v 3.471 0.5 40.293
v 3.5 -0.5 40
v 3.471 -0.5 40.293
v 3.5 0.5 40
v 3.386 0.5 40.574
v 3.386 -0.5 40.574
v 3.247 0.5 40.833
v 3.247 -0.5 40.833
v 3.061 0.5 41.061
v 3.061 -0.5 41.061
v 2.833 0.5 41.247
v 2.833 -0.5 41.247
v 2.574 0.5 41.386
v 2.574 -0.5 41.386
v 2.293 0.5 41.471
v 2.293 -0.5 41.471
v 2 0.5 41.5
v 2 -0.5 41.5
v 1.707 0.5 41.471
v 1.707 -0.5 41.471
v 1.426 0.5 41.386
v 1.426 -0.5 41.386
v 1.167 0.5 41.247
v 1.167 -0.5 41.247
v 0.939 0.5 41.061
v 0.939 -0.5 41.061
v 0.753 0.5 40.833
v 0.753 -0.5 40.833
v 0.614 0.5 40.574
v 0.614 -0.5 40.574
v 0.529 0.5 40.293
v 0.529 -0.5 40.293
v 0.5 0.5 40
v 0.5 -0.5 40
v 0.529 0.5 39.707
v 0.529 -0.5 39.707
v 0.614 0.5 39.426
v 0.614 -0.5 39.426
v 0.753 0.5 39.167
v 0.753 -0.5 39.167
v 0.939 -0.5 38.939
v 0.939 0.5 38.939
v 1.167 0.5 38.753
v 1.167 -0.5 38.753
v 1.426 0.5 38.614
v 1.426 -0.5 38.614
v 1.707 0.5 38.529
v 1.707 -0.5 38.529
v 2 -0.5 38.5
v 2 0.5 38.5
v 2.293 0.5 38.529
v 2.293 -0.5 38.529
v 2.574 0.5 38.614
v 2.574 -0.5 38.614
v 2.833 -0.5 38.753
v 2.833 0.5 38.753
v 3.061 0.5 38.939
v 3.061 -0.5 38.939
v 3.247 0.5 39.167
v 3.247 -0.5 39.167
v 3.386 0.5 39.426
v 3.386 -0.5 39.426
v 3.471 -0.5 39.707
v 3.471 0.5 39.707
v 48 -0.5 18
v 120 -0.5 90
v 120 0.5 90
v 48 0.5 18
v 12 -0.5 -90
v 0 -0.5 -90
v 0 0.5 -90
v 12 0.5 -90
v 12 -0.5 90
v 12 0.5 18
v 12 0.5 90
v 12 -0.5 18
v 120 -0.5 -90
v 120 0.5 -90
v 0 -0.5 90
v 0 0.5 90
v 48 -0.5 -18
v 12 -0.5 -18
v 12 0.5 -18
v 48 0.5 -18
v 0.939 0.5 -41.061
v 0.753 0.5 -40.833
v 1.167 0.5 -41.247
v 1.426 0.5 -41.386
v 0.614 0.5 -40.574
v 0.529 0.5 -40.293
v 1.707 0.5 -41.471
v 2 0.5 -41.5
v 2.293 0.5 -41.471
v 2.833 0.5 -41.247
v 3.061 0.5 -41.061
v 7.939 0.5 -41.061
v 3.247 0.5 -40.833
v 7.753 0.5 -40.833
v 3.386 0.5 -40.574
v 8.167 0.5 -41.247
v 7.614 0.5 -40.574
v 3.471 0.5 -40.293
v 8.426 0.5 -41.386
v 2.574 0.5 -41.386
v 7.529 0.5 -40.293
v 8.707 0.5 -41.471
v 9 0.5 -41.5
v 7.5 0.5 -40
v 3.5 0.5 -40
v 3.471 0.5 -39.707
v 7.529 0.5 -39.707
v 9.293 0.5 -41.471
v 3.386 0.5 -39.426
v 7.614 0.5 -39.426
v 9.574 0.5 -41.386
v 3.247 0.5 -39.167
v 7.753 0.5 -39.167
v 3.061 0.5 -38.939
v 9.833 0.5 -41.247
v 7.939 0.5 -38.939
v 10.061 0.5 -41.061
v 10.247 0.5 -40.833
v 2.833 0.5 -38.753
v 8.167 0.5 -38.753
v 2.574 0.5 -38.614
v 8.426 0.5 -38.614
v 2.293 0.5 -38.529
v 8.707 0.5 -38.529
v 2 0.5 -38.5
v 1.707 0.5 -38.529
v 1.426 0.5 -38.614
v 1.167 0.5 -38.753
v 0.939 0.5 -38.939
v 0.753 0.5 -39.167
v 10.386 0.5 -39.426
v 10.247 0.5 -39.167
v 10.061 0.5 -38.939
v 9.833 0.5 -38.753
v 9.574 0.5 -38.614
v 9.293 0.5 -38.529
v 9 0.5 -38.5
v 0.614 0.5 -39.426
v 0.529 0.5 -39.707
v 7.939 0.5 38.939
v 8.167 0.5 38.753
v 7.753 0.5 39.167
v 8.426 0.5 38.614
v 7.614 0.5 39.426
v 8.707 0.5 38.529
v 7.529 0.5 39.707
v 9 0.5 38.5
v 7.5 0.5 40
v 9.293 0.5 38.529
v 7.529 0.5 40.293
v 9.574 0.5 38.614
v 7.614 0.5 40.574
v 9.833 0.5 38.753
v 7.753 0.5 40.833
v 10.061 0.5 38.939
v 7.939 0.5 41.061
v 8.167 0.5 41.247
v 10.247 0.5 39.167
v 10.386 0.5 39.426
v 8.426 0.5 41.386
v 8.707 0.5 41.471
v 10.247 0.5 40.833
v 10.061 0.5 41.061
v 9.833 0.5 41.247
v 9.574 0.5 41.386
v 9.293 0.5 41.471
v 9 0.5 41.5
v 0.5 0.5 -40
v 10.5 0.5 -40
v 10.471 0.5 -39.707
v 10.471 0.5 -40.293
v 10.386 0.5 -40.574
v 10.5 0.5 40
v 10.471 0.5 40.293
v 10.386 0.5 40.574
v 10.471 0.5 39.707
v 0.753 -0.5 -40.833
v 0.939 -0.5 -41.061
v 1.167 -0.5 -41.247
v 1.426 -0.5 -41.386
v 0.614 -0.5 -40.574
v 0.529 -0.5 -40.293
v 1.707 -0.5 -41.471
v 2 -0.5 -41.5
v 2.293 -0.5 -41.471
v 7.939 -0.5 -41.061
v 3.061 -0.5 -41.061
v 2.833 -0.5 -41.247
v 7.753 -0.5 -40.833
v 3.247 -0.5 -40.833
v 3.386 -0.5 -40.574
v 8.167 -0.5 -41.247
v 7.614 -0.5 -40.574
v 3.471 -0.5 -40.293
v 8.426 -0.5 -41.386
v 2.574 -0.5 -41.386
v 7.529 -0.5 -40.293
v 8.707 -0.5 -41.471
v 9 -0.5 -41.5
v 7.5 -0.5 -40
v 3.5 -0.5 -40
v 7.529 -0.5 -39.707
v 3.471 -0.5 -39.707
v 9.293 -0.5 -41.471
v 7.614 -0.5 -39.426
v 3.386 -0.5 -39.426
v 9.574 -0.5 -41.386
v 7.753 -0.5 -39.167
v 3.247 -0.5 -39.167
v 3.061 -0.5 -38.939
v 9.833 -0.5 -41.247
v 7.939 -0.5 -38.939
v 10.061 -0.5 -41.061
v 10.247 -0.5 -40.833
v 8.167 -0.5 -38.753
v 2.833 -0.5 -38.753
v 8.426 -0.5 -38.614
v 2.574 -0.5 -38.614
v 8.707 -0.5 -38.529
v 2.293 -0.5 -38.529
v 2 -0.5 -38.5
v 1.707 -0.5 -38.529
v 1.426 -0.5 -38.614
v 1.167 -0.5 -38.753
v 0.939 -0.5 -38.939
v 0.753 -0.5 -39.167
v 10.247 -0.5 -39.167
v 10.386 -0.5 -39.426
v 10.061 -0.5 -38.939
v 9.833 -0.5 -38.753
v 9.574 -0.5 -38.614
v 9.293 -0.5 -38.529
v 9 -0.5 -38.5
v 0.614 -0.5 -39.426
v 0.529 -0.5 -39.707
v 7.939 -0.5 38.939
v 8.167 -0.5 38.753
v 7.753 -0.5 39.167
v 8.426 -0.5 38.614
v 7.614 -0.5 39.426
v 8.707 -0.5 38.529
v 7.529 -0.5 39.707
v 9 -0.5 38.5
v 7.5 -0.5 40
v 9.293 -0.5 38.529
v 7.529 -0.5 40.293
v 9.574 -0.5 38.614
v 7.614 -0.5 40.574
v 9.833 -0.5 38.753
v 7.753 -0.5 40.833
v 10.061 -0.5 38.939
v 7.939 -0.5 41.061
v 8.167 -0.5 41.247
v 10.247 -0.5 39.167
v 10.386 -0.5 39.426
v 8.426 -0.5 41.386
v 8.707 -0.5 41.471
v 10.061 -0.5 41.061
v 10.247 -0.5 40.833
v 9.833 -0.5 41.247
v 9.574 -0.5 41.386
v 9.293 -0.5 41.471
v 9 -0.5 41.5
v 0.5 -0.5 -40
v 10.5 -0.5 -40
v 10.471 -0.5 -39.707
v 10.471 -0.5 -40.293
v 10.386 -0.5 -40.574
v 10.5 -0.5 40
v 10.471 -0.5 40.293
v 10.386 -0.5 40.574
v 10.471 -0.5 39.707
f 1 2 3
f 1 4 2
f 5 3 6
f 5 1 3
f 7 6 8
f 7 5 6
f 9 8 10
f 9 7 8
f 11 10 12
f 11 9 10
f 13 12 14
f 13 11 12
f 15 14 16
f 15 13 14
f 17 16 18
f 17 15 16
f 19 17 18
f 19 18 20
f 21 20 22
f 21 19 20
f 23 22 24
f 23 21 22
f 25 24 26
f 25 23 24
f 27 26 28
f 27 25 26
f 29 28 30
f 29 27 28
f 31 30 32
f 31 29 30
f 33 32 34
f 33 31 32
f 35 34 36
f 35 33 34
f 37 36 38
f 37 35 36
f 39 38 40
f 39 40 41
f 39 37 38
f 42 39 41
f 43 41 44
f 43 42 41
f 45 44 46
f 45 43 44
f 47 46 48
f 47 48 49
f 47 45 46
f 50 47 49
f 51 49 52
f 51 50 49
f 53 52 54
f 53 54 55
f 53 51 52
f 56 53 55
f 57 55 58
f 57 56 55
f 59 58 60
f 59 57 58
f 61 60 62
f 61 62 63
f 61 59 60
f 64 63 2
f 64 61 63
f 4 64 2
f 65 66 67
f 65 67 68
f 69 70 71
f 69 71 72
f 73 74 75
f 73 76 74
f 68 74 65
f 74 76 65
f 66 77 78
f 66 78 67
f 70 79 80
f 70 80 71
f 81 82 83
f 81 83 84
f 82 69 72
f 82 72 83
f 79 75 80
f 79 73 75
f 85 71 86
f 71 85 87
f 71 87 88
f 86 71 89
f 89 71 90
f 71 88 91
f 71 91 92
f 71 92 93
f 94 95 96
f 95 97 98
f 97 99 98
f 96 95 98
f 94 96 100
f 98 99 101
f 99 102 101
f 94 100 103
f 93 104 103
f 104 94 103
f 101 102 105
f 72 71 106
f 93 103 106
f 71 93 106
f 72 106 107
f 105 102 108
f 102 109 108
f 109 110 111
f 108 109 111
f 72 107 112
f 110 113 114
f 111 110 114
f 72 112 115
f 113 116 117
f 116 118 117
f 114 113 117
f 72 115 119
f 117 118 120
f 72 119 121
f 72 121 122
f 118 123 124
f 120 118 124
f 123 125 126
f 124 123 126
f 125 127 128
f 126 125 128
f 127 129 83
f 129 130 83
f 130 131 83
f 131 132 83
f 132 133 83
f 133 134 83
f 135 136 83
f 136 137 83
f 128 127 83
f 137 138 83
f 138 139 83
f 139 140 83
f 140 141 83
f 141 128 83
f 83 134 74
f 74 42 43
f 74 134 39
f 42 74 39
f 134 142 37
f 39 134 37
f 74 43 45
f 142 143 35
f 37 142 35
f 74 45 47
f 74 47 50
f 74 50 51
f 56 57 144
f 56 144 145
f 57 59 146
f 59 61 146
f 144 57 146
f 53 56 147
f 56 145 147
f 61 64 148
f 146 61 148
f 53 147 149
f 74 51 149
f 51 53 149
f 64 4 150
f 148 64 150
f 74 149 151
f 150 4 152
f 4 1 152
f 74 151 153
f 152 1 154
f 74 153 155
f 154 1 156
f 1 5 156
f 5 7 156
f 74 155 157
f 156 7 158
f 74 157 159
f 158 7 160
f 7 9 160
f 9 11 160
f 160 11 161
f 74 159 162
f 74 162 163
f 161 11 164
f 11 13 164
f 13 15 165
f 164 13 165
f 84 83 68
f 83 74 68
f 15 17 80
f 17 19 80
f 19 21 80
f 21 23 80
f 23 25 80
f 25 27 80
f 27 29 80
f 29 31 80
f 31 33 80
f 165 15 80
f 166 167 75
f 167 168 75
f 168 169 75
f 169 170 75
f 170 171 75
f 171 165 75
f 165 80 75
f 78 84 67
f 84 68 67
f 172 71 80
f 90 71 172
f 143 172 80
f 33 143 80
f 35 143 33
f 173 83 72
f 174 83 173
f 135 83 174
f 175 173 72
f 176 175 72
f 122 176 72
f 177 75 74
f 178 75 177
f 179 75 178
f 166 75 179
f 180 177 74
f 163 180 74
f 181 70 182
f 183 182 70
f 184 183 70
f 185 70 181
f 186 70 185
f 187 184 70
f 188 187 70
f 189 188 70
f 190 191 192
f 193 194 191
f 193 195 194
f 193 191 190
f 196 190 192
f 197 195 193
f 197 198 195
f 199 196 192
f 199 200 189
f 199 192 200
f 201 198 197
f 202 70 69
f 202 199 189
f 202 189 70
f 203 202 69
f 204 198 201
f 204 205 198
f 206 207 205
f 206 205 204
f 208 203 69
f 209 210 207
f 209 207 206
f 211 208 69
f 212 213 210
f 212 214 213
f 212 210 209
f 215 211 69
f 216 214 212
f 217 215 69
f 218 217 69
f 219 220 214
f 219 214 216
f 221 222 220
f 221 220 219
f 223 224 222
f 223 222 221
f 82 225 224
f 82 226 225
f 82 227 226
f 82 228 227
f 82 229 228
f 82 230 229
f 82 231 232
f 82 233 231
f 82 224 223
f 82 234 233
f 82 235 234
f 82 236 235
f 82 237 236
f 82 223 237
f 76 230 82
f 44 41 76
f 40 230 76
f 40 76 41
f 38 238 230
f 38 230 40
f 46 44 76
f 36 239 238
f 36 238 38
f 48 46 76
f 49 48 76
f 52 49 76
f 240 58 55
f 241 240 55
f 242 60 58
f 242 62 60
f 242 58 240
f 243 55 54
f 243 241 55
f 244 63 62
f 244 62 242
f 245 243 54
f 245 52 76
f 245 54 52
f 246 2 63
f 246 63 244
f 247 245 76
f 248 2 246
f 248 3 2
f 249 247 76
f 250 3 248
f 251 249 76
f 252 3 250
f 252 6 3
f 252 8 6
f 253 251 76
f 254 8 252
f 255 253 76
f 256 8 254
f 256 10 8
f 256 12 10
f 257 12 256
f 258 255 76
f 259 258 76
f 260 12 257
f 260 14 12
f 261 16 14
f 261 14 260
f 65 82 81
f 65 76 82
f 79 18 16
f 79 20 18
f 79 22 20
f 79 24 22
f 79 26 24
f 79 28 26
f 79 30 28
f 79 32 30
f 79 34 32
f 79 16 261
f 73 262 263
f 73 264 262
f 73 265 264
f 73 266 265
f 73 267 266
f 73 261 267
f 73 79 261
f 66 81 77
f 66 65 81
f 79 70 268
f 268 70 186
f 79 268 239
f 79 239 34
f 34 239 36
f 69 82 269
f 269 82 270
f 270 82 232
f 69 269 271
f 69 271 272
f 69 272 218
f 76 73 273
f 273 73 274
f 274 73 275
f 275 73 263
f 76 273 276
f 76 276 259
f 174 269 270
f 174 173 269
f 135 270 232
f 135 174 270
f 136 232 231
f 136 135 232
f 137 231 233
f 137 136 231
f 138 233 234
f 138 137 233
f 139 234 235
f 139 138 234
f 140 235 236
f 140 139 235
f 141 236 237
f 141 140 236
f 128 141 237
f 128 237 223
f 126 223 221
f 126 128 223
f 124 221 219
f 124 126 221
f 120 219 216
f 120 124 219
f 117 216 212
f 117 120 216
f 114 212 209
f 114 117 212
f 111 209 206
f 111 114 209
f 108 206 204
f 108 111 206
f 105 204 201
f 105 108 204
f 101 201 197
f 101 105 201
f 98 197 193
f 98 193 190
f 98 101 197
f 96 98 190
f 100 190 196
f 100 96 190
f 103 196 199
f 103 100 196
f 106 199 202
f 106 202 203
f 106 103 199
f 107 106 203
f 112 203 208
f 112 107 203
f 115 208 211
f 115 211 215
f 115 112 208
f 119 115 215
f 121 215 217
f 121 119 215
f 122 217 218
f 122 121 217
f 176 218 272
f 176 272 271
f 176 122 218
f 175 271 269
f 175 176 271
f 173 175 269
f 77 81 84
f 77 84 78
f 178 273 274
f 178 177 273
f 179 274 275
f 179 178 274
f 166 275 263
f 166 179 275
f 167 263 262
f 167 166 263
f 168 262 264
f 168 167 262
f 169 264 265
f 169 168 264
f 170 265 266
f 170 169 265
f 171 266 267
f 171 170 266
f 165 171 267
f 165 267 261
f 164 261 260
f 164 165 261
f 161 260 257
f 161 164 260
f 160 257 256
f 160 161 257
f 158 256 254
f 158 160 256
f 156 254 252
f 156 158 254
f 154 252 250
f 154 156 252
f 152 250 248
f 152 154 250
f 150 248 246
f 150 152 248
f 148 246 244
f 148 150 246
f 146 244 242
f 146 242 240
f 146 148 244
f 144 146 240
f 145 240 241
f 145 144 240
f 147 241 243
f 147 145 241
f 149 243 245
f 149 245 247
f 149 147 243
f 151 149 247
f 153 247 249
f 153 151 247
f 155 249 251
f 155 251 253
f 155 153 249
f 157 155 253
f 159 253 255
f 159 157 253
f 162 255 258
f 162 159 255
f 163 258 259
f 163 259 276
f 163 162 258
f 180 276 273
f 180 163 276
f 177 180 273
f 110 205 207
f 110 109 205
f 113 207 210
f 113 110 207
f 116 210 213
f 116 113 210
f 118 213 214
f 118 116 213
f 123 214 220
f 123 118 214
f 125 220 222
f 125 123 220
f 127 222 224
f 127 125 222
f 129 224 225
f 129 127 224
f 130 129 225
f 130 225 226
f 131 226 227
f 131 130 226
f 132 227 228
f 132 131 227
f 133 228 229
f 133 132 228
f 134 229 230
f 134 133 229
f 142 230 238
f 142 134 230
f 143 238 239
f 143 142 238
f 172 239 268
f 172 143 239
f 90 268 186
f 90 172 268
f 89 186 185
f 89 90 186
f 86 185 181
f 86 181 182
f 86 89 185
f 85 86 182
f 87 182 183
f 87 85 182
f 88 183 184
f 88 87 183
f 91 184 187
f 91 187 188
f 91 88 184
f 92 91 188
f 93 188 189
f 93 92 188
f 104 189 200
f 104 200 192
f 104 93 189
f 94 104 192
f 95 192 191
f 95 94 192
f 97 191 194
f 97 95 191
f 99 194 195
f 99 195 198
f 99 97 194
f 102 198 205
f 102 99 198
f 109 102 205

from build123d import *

# Parameters (mm, degrees)
F0_R     = 1.5
F0_W     = 36
F0_H     = 36
F1_DEPTH = 0.5


with BuildPart() as f1:
    # F0 (on Front) → F1 (new body, symmetric)
    with BuildSketch(Plane.XZ):
        Polygon((12, 90), (0, 90), (0, -90), (12, -90), (12, -18), (12, 18), align=None)
        with Locations((2, -40)):
            Circle(F0_R, mode=Mode.SUBTRACT)
        with Locations((9, -40)):
            Circle(F0_R, mode=Mode.SUBTRACT)
        with Locations((2, 40)):
            Circle(F0_R, mode=Mode.SUBTRACT)
        with Locations((9, 40)):
            Circle(F0_R, mode=Mode.SUBTRACT)
        with Locations((30, 0)):
            Rectangle(F0_W, F0_H)
        Polygon((120, 90), (48, 18), (48, -18), (120, -90), align=None)
    extrude(amount=F1_DEPTH, both=True)


solid = f1.part
